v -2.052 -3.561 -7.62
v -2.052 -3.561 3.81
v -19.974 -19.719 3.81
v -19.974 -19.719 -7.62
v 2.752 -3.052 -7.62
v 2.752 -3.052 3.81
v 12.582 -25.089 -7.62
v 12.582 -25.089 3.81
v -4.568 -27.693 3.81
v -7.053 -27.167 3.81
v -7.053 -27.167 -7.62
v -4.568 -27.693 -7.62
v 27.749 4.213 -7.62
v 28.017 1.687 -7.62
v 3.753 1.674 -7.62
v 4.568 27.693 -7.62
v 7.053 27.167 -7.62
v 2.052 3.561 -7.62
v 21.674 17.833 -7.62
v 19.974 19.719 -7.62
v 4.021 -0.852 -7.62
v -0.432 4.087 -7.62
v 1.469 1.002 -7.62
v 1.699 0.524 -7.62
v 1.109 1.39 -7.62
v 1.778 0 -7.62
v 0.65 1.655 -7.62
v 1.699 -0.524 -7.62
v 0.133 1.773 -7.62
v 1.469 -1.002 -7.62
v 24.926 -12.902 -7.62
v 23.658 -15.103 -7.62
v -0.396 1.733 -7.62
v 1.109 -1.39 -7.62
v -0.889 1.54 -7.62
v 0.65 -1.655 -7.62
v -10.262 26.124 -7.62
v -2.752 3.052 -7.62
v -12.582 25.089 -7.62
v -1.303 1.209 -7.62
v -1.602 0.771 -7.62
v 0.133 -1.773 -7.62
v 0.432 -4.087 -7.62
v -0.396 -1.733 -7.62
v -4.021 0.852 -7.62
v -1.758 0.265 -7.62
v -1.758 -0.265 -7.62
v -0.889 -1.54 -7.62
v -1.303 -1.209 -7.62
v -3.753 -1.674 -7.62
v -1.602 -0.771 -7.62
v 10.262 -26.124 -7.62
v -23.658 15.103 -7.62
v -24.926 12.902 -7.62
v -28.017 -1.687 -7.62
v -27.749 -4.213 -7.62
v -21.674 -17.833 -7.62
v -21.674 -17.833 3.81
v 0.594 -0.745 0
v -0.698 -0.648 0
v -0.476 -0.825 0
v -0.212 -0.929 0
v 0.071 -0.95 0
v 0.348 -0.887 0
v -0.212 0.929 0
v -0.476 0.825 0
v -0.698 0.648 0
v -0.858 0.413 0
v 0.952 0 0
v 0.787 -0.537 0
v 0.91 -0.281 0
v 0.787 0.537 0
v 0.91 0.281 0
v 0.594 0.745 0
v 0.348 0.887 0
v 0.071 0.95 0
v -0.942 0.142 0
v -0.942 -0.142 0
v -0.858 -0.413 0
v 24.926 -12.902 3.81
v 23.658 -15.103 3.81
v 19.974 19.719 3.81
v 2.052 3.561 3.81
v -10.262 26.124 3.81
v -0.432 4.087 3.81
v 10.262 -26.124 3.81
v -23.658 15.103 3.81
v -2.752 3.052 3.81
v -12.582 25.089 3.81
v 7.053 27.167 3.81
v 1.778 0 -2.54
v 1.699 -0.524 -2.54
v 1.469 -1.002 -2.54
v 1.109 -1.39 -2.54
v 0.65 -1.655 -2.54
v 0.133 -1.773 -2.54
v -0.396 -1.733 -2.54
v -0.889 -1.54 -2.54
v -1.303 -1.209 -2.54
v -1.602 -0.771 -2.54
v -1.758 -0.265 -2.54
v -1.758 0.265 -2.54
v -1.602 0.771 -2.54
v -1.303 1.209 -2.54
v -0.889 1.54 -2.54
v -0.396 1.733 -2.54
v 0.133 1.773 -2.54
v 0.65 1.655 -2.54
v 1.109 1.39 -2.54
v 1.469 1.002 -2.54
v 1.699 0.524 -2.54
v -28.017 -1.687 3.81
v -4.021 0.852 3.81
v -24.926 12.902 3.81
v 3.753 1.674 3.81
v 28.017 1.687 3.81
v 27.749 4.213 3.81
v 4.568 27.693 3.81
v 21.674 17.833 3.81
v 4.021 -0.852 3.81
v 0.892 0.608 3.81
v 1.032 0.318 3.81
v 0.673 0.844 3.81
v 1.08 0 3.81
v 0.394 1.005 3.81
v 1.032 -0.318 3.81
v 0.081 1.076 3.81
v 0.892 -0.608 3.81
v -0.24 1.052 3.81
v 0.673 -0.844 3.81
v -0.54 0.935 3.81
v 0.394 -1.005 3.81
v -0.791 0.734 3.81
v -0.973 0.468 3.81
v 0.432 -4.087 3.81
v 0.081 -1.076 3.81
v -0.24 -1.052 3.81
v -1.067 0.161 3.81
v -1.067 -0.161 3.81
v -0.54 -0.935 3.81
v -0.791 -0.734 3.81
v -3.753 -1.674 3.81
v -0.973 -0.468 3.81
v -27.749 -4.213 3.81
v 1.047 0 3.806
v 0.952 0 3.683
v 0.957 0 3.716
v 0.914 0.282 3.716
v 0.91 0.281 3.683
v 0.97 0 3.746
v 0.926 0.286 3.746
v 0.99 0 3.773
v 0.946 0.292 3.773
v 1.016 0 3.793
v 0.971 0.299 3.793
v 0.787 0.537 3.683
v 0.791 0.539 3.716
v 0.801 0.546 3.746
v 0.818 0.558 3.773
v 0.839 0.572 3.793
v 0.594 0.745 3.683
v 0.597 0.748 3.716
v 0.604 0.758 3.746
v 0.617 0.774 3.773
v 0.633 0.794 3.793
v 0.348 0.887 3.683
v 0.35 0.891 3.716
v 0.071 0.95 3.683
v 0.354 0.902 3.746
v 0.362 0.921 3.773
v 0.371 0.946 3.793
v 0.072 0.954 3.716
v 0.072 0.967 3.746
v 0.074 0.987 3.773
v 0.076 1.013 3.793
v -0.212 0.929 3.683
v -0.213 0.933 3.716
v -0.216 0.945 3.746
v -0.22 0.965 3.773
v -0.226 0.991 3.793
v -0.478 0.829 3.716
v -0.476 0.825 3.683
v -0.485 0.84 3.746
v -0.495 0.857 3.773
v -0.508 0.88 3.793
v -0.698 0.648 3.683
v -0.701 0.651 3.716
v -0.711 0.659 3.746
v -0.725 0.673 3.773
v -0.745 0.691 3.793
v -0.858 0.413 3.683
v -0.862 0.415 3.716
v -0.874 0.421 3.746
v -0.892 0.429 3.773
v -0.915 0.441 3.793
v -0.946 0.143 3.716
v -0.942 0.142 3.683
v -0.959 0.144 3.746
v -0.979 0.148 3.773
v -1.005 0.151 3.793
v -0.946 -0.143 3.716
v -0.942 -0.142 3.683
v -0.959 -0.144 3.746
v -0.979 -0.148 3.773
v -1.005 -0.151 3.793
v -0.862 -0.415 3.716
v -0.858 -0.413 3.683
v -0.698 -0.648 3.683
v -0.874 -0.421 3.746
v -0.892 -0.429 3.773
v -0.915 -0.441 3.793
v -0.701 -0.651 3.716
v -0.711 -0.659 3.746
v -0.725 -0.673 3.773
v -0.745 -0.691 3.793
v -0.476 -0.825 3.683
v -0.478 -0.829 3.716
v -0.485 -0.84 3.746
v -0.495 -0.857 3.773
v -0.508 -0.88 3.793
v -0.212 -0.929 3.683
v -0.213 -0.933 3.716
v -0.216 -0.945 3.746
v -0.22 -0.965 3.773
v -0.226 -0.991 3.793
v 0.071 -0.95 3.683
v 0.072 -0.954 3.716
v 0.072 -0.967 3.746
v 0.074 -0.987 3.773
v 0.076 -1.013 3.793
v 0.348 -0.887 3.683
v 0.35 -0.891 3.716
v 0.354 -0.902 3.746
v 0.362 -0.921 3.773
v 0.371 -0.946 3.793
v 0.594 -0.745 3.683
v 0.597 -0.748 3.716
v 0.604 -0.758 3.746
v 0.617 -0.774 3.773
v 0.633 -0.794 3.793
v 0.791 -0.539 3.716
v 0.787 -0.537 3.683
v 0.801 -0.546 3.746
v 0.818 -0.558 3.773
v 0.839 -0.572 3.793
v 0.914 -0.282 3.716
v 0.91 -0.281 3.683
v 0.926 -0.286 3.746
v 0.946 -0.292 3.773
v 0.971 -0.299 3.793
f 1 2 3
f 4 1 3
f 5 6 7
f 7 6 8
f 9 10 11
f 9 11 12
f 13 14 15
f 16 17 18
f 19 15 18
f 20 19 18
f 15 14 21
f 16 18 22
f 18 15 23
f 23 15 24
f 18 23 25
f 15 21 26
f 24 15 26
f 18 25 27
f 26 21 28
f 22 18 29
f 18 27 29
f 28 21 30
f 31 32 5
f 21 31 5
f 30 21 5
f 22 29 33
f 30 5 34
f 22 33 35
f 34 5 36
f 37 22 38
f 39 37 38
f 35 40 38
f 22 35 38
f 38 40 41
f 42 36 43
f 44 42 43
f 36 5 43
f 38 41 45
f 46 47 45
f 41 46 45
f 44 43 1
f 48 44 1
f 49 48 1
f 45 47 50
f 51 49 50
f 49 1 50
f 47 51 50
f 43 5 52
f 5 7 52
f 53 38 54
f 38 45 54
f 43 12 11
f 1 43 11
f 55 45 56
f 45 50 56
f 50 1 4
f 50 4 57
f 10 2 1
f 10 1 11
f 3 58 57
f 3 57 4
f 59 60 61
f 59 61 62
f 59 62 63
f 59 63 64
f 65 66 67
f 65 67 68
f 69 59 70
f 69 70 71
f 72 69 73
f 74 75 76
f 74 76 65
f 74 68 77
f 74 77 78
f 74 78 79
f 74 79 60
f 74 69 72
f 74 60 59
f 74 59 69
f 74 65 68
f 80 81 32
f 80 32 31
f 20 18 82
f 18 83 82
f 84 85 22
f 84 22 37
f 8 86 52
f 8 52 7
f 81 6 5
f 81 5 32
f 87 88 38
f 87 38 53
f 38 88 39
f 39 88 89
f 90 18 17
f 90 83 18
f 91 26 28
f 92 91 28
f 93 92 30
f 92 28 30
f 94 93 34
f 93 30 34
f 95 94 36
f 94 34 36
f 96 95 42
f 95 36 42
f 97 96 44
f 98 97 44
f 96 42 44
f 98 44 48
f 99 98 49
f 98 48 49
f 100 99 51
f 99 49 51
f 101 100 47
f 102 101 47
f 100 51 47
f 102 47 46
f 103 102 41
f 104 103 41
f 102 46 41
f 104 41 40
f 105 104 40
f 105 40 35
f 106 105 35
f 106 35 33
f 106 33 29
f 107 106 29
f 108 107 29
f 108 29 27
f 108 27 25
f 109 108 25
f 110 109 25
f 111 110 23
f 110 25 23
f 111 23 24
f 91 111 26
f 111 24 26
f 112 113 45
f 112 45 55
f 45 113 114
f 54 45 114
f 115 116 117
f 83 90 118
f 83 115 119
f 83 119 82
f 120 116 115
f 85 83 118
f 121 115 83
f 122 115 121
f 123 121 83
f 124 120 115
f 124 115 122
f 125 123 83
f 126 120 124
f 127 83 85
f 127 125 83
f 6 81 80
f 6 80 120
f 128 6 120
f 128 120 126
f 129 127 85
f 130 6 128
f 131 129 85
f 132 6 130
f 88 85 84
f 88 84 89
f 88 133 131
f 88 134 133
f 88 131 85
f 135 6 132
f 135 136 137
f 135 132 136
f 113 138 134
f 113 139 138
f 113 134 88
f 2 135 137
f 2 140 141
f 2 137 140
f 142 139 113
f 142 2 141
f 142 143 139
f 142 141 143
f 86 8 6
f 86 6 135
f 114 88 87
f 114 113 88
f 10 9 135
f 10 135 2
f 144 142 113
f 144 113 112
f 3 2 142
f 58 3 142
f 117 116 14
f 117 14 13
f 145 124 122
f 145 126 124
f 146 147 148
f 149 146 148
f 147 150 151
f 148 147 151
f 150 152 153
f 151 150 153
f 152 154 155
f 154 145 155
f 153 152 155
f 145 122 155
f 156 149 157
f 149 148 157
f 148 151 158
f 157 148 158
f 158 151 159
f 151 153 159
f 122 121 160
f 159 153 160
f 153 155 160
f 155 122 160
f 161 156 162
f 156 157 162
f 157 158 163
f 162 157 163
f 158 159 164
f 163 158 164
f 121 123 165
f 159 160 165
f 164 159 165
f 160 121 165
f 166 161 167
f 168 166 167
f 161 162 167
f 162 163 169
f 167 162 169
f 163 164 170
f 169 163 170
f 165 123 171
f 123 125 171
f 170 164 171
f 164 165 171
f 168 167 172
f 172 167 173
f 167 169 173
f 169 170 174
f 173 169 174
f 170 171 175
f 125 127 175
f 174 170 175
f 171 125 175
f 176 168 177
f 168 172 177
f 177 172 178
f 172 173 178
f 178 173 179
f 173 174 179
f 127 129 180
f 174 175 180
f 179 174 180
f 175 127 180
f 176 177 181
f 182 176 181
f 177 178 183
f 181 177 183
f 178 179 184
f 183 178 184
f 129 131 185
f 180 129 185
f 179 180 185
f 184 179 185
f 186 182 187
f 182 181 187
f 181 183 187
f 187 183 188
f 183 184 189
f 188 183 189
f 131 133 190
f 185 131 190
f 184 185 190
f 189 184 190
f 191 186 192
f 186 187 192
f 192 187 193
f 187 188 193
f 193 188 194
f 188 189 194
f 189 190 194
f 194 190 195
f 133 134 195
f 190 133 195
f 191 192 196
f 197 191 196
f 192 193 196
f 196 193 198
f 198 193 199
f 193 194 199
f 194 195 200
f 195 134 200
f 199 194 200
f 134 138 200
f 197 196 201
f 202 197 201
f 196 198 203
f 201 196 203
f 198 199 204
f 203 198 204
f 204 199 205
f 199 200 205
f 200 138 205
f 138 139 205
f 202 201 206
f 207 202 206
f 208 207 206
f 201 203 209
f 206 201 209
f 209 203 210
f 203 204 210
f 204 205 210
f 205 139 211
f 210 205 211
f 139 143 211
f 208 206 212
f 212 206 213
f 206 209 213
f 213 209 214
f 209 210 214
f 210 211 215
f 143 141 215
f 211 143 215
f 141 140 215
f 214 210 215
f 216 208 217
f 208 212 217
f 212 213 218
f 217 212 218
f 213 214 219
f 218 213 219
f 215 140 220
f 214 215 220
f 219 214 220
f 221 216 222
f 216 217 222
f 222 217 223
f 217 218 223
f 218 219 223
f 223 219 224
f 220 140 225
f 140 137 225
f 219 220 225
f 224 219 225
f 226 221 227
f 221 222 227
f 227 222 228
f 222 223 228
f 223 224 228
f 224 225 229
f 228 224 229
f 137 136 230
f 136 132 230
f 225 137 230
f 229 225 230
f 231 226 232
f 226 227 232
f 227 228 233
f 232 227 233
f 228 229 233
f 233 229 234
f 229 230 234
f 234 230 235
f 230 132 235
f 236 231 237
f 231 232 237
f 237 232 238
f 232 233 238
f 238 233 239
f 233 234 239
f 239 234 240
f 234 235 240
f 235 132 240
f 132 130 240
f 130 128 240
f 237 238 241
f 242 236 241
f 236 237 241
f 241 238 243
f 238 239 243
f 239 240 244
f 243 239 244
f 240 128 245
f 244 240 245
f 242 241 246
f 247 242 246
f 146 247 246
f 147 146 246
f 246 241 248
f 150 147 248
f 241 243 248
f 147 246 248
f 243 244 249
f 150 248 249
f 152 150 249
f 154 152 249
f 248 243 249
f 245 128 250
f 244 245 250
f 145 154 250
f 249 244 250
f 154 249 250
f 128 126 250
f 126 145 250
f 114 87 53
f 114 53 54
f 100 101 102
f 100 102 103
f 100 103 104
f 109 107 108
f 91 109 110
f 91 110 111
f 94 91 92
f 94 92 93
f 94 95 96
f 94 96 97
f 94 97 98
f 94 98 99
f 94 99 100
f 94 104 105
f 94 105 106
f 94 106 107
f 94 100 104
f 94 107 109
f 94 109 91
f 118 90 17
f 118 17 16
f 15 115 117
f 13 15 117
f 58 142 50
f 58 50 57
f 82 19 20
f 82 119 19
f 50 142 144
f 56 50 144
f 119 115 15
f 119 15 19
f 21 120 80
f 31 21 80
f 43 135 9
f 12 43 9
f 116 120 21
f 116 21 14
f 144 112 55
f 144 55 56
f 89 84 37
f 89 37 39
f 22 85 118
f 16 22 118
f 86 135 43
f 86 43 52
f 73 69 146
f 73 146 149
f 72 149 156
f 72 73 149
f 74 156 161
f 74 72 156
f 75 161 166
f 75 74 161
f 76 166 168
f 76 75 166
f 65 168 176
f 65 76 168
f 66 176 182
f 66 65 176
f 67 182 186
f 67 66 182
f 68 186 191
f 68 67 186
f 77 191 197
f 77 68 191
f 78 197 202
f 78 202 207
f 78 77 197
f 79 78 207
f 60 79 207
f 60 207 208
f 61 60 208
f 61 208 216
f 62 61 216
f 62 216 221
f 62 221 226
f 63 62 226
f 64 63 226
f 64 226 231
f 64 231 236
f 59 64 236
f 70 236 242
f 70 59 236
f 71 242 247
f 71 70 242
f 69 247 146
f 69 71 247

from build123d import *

# Parameters (mm, degrees)
F0_R      = 0.9525
F1_DEPTH  = 3.81
F2_R      = 0.127
F3_DEPTH  = 2.54
F4_DEPTH  = 24.13
F5_DEPTH  = 24.13
F6_DEPTH  = 24.13
F7_DEPTH  = 24.13
F8_DEPTH  = 24.13
F9_DEPTH  = 24.13
F10_DEPTH = 24.13
F11_DEPTH = 24.13
F12_DEPTH = 24.13
F13_DEPTH = 24.13
F14_DEPTH = 5.08
F15_R     = 1.778
F16_DEPTH = 5.08


with BuildPart() as f1:
    # F0 (on Top) → F1 (new body)
    with BuildSketch(Plane.XY):
        Polygon((0.4323873163, -4.0869975888), (2.7520855959, -3.0522996175), (4.0205807178, -0.8517269361), (3.75335066, 1.6741764857), (2.0524682218, 3.5606013931), (-0.4323873163, 4.0869975888), (-2.7520855959, 3.0522996175), (-4.0205807178, 0.8517269361), (-3.75335066, -1.6741764857), (-2.0524682218, -3.5606013931), align=None)
        Circle(F0_R, mode=Mode.SUBTRACT)
    extrude(amount=F1_DEPTH)

    # F2
    f2_edges = [f1.edges().sort_by_distance(p)[0] for p in [
        (-0.9525, 0, 3.81),
    ]]
    fillet(f2_edges, radius=F2_R)

    # F0 (on Top) → F3 (join)
    with BuildSketch(Plane.XY):
        Polygon((0.4323873163, -4.0869975888), (2.7520855959, -3.0522996175), (4.0205807178, -0.8517269361), (3.75335066, 1.6741764857), (2.0524682218, 3.5606013931), (-0.4323873163, 4.0869975888), (-2.7520855959, 3.0522996175), (-4.0205807178, 0.8517269361), (-3.75335066, -1.6741764857), (-2.0524682218, -3.5606013931), align=None)
        Circle(F0_R, mode=Mode.SUBTRACT)
        Circle(F0_R)
    extrude(amount=-F3_DEPTH)

    # F4 (add): a face of the model
    f4_faces = [f1.faces().sort_by_distance(p)[0] for p in [
        (2.9029094409, 2.6173889394, 0.635),
    ]]
    extrude(f4_faces, amount=F4_DEPTH)

    # F5 (add): a face of the model
    f5_faces = [f1.faces().sort_by_distance(p)[0] for p in [
        (3.8869656889, 0.4112247748, 0.635),
    ]]
    extrude(f5_faces, amount=F5_DEPTH)

    # F6 (add): a face of the model
    f6_faces = [f1.faces().sort_by_distance(p)[0] for p in [
        (3.3863331568, -1.9520132768, 0.635),
    ]]
    extrude(f6_faces, amount=F6_DEPTH)

    # F7 (add): a face of the model
    f7_faces = [f1.faces().sort_by_distance(p)[0] for p in [
        (1.5922364561, -3.5696486031, 0.635),
    ]]
    extrude(f7_faces, amount=F7_DEPTH)

    # F8 (add): a face of the model
    f8_faces = [f1.faces().sort_by_distance(p)[0] for p in [
        (-0.8100404527, -3.8237994909, 0.635),
    ]]
    extrude(f8_faces, amount=F8_DEPTH)

    # F9 (add): a face of the model
    f9_faces = [f1.faces().sort_by_distance(p)[0] for p in [
        (-2.9029094409, -2.6173889394, 0.635),
    ]]
    extrude(f9_faces, amount=F9_DEPTH)

    # F10 (add): a face of the model
    f10_faces = [f1.faces().sort_by_distance(p)[0] for p in [
        (-3.8869656889, -0.4112247748, 0.635),
    ]]
    extrude(f10_faces, amount=F10_DEPTH)

    # F11 (add): a face of the model
    f11_faces = [f1.faces().sort_by_distance(p)[0] for p in [
        (-3.3863331568, 1.9520132768, 0.635),
    ]]
    extrude(f11_faces, amount=F11_DEPTH)

    # F12 (add): a face of the model
    f12_faces = [f1.faces().sort_by_distance(p)[0] for p in [
        (-1.5922364561, 3.5696486031, 0.635),
    ]]
    extrude(f12_faces, amount=F12_DEPTH)

    # F13 (add): a face of the model
    f13_faces = [f1.faces().sort_by_distance(p)[0] for p in [
        (0.8100404527, 3.8237994909, 0.635),
    ]]
    extrude(f13_faces, amount=F13_DEPTH)

    # F14 (add): a face of the model
    f14_faces = [f1.faces().sort_by_distance(p)[0] for p in [
        (0, 0, -2.54),
    ]]
    extrude(f14_faces, amount=F14_DEPTH)

    # F15 (on face) → F16 (cut)
    with BuildSketch(Plane(origin=(0, 0, -7.62), x_dir=(1, 0, 0), z_dir=(0, 0, -1))):
        Circle(F15_R)
    extrude(amount=-F16_DEPTH, mode=Mode.SUBTRACT)


solid = f1.part
